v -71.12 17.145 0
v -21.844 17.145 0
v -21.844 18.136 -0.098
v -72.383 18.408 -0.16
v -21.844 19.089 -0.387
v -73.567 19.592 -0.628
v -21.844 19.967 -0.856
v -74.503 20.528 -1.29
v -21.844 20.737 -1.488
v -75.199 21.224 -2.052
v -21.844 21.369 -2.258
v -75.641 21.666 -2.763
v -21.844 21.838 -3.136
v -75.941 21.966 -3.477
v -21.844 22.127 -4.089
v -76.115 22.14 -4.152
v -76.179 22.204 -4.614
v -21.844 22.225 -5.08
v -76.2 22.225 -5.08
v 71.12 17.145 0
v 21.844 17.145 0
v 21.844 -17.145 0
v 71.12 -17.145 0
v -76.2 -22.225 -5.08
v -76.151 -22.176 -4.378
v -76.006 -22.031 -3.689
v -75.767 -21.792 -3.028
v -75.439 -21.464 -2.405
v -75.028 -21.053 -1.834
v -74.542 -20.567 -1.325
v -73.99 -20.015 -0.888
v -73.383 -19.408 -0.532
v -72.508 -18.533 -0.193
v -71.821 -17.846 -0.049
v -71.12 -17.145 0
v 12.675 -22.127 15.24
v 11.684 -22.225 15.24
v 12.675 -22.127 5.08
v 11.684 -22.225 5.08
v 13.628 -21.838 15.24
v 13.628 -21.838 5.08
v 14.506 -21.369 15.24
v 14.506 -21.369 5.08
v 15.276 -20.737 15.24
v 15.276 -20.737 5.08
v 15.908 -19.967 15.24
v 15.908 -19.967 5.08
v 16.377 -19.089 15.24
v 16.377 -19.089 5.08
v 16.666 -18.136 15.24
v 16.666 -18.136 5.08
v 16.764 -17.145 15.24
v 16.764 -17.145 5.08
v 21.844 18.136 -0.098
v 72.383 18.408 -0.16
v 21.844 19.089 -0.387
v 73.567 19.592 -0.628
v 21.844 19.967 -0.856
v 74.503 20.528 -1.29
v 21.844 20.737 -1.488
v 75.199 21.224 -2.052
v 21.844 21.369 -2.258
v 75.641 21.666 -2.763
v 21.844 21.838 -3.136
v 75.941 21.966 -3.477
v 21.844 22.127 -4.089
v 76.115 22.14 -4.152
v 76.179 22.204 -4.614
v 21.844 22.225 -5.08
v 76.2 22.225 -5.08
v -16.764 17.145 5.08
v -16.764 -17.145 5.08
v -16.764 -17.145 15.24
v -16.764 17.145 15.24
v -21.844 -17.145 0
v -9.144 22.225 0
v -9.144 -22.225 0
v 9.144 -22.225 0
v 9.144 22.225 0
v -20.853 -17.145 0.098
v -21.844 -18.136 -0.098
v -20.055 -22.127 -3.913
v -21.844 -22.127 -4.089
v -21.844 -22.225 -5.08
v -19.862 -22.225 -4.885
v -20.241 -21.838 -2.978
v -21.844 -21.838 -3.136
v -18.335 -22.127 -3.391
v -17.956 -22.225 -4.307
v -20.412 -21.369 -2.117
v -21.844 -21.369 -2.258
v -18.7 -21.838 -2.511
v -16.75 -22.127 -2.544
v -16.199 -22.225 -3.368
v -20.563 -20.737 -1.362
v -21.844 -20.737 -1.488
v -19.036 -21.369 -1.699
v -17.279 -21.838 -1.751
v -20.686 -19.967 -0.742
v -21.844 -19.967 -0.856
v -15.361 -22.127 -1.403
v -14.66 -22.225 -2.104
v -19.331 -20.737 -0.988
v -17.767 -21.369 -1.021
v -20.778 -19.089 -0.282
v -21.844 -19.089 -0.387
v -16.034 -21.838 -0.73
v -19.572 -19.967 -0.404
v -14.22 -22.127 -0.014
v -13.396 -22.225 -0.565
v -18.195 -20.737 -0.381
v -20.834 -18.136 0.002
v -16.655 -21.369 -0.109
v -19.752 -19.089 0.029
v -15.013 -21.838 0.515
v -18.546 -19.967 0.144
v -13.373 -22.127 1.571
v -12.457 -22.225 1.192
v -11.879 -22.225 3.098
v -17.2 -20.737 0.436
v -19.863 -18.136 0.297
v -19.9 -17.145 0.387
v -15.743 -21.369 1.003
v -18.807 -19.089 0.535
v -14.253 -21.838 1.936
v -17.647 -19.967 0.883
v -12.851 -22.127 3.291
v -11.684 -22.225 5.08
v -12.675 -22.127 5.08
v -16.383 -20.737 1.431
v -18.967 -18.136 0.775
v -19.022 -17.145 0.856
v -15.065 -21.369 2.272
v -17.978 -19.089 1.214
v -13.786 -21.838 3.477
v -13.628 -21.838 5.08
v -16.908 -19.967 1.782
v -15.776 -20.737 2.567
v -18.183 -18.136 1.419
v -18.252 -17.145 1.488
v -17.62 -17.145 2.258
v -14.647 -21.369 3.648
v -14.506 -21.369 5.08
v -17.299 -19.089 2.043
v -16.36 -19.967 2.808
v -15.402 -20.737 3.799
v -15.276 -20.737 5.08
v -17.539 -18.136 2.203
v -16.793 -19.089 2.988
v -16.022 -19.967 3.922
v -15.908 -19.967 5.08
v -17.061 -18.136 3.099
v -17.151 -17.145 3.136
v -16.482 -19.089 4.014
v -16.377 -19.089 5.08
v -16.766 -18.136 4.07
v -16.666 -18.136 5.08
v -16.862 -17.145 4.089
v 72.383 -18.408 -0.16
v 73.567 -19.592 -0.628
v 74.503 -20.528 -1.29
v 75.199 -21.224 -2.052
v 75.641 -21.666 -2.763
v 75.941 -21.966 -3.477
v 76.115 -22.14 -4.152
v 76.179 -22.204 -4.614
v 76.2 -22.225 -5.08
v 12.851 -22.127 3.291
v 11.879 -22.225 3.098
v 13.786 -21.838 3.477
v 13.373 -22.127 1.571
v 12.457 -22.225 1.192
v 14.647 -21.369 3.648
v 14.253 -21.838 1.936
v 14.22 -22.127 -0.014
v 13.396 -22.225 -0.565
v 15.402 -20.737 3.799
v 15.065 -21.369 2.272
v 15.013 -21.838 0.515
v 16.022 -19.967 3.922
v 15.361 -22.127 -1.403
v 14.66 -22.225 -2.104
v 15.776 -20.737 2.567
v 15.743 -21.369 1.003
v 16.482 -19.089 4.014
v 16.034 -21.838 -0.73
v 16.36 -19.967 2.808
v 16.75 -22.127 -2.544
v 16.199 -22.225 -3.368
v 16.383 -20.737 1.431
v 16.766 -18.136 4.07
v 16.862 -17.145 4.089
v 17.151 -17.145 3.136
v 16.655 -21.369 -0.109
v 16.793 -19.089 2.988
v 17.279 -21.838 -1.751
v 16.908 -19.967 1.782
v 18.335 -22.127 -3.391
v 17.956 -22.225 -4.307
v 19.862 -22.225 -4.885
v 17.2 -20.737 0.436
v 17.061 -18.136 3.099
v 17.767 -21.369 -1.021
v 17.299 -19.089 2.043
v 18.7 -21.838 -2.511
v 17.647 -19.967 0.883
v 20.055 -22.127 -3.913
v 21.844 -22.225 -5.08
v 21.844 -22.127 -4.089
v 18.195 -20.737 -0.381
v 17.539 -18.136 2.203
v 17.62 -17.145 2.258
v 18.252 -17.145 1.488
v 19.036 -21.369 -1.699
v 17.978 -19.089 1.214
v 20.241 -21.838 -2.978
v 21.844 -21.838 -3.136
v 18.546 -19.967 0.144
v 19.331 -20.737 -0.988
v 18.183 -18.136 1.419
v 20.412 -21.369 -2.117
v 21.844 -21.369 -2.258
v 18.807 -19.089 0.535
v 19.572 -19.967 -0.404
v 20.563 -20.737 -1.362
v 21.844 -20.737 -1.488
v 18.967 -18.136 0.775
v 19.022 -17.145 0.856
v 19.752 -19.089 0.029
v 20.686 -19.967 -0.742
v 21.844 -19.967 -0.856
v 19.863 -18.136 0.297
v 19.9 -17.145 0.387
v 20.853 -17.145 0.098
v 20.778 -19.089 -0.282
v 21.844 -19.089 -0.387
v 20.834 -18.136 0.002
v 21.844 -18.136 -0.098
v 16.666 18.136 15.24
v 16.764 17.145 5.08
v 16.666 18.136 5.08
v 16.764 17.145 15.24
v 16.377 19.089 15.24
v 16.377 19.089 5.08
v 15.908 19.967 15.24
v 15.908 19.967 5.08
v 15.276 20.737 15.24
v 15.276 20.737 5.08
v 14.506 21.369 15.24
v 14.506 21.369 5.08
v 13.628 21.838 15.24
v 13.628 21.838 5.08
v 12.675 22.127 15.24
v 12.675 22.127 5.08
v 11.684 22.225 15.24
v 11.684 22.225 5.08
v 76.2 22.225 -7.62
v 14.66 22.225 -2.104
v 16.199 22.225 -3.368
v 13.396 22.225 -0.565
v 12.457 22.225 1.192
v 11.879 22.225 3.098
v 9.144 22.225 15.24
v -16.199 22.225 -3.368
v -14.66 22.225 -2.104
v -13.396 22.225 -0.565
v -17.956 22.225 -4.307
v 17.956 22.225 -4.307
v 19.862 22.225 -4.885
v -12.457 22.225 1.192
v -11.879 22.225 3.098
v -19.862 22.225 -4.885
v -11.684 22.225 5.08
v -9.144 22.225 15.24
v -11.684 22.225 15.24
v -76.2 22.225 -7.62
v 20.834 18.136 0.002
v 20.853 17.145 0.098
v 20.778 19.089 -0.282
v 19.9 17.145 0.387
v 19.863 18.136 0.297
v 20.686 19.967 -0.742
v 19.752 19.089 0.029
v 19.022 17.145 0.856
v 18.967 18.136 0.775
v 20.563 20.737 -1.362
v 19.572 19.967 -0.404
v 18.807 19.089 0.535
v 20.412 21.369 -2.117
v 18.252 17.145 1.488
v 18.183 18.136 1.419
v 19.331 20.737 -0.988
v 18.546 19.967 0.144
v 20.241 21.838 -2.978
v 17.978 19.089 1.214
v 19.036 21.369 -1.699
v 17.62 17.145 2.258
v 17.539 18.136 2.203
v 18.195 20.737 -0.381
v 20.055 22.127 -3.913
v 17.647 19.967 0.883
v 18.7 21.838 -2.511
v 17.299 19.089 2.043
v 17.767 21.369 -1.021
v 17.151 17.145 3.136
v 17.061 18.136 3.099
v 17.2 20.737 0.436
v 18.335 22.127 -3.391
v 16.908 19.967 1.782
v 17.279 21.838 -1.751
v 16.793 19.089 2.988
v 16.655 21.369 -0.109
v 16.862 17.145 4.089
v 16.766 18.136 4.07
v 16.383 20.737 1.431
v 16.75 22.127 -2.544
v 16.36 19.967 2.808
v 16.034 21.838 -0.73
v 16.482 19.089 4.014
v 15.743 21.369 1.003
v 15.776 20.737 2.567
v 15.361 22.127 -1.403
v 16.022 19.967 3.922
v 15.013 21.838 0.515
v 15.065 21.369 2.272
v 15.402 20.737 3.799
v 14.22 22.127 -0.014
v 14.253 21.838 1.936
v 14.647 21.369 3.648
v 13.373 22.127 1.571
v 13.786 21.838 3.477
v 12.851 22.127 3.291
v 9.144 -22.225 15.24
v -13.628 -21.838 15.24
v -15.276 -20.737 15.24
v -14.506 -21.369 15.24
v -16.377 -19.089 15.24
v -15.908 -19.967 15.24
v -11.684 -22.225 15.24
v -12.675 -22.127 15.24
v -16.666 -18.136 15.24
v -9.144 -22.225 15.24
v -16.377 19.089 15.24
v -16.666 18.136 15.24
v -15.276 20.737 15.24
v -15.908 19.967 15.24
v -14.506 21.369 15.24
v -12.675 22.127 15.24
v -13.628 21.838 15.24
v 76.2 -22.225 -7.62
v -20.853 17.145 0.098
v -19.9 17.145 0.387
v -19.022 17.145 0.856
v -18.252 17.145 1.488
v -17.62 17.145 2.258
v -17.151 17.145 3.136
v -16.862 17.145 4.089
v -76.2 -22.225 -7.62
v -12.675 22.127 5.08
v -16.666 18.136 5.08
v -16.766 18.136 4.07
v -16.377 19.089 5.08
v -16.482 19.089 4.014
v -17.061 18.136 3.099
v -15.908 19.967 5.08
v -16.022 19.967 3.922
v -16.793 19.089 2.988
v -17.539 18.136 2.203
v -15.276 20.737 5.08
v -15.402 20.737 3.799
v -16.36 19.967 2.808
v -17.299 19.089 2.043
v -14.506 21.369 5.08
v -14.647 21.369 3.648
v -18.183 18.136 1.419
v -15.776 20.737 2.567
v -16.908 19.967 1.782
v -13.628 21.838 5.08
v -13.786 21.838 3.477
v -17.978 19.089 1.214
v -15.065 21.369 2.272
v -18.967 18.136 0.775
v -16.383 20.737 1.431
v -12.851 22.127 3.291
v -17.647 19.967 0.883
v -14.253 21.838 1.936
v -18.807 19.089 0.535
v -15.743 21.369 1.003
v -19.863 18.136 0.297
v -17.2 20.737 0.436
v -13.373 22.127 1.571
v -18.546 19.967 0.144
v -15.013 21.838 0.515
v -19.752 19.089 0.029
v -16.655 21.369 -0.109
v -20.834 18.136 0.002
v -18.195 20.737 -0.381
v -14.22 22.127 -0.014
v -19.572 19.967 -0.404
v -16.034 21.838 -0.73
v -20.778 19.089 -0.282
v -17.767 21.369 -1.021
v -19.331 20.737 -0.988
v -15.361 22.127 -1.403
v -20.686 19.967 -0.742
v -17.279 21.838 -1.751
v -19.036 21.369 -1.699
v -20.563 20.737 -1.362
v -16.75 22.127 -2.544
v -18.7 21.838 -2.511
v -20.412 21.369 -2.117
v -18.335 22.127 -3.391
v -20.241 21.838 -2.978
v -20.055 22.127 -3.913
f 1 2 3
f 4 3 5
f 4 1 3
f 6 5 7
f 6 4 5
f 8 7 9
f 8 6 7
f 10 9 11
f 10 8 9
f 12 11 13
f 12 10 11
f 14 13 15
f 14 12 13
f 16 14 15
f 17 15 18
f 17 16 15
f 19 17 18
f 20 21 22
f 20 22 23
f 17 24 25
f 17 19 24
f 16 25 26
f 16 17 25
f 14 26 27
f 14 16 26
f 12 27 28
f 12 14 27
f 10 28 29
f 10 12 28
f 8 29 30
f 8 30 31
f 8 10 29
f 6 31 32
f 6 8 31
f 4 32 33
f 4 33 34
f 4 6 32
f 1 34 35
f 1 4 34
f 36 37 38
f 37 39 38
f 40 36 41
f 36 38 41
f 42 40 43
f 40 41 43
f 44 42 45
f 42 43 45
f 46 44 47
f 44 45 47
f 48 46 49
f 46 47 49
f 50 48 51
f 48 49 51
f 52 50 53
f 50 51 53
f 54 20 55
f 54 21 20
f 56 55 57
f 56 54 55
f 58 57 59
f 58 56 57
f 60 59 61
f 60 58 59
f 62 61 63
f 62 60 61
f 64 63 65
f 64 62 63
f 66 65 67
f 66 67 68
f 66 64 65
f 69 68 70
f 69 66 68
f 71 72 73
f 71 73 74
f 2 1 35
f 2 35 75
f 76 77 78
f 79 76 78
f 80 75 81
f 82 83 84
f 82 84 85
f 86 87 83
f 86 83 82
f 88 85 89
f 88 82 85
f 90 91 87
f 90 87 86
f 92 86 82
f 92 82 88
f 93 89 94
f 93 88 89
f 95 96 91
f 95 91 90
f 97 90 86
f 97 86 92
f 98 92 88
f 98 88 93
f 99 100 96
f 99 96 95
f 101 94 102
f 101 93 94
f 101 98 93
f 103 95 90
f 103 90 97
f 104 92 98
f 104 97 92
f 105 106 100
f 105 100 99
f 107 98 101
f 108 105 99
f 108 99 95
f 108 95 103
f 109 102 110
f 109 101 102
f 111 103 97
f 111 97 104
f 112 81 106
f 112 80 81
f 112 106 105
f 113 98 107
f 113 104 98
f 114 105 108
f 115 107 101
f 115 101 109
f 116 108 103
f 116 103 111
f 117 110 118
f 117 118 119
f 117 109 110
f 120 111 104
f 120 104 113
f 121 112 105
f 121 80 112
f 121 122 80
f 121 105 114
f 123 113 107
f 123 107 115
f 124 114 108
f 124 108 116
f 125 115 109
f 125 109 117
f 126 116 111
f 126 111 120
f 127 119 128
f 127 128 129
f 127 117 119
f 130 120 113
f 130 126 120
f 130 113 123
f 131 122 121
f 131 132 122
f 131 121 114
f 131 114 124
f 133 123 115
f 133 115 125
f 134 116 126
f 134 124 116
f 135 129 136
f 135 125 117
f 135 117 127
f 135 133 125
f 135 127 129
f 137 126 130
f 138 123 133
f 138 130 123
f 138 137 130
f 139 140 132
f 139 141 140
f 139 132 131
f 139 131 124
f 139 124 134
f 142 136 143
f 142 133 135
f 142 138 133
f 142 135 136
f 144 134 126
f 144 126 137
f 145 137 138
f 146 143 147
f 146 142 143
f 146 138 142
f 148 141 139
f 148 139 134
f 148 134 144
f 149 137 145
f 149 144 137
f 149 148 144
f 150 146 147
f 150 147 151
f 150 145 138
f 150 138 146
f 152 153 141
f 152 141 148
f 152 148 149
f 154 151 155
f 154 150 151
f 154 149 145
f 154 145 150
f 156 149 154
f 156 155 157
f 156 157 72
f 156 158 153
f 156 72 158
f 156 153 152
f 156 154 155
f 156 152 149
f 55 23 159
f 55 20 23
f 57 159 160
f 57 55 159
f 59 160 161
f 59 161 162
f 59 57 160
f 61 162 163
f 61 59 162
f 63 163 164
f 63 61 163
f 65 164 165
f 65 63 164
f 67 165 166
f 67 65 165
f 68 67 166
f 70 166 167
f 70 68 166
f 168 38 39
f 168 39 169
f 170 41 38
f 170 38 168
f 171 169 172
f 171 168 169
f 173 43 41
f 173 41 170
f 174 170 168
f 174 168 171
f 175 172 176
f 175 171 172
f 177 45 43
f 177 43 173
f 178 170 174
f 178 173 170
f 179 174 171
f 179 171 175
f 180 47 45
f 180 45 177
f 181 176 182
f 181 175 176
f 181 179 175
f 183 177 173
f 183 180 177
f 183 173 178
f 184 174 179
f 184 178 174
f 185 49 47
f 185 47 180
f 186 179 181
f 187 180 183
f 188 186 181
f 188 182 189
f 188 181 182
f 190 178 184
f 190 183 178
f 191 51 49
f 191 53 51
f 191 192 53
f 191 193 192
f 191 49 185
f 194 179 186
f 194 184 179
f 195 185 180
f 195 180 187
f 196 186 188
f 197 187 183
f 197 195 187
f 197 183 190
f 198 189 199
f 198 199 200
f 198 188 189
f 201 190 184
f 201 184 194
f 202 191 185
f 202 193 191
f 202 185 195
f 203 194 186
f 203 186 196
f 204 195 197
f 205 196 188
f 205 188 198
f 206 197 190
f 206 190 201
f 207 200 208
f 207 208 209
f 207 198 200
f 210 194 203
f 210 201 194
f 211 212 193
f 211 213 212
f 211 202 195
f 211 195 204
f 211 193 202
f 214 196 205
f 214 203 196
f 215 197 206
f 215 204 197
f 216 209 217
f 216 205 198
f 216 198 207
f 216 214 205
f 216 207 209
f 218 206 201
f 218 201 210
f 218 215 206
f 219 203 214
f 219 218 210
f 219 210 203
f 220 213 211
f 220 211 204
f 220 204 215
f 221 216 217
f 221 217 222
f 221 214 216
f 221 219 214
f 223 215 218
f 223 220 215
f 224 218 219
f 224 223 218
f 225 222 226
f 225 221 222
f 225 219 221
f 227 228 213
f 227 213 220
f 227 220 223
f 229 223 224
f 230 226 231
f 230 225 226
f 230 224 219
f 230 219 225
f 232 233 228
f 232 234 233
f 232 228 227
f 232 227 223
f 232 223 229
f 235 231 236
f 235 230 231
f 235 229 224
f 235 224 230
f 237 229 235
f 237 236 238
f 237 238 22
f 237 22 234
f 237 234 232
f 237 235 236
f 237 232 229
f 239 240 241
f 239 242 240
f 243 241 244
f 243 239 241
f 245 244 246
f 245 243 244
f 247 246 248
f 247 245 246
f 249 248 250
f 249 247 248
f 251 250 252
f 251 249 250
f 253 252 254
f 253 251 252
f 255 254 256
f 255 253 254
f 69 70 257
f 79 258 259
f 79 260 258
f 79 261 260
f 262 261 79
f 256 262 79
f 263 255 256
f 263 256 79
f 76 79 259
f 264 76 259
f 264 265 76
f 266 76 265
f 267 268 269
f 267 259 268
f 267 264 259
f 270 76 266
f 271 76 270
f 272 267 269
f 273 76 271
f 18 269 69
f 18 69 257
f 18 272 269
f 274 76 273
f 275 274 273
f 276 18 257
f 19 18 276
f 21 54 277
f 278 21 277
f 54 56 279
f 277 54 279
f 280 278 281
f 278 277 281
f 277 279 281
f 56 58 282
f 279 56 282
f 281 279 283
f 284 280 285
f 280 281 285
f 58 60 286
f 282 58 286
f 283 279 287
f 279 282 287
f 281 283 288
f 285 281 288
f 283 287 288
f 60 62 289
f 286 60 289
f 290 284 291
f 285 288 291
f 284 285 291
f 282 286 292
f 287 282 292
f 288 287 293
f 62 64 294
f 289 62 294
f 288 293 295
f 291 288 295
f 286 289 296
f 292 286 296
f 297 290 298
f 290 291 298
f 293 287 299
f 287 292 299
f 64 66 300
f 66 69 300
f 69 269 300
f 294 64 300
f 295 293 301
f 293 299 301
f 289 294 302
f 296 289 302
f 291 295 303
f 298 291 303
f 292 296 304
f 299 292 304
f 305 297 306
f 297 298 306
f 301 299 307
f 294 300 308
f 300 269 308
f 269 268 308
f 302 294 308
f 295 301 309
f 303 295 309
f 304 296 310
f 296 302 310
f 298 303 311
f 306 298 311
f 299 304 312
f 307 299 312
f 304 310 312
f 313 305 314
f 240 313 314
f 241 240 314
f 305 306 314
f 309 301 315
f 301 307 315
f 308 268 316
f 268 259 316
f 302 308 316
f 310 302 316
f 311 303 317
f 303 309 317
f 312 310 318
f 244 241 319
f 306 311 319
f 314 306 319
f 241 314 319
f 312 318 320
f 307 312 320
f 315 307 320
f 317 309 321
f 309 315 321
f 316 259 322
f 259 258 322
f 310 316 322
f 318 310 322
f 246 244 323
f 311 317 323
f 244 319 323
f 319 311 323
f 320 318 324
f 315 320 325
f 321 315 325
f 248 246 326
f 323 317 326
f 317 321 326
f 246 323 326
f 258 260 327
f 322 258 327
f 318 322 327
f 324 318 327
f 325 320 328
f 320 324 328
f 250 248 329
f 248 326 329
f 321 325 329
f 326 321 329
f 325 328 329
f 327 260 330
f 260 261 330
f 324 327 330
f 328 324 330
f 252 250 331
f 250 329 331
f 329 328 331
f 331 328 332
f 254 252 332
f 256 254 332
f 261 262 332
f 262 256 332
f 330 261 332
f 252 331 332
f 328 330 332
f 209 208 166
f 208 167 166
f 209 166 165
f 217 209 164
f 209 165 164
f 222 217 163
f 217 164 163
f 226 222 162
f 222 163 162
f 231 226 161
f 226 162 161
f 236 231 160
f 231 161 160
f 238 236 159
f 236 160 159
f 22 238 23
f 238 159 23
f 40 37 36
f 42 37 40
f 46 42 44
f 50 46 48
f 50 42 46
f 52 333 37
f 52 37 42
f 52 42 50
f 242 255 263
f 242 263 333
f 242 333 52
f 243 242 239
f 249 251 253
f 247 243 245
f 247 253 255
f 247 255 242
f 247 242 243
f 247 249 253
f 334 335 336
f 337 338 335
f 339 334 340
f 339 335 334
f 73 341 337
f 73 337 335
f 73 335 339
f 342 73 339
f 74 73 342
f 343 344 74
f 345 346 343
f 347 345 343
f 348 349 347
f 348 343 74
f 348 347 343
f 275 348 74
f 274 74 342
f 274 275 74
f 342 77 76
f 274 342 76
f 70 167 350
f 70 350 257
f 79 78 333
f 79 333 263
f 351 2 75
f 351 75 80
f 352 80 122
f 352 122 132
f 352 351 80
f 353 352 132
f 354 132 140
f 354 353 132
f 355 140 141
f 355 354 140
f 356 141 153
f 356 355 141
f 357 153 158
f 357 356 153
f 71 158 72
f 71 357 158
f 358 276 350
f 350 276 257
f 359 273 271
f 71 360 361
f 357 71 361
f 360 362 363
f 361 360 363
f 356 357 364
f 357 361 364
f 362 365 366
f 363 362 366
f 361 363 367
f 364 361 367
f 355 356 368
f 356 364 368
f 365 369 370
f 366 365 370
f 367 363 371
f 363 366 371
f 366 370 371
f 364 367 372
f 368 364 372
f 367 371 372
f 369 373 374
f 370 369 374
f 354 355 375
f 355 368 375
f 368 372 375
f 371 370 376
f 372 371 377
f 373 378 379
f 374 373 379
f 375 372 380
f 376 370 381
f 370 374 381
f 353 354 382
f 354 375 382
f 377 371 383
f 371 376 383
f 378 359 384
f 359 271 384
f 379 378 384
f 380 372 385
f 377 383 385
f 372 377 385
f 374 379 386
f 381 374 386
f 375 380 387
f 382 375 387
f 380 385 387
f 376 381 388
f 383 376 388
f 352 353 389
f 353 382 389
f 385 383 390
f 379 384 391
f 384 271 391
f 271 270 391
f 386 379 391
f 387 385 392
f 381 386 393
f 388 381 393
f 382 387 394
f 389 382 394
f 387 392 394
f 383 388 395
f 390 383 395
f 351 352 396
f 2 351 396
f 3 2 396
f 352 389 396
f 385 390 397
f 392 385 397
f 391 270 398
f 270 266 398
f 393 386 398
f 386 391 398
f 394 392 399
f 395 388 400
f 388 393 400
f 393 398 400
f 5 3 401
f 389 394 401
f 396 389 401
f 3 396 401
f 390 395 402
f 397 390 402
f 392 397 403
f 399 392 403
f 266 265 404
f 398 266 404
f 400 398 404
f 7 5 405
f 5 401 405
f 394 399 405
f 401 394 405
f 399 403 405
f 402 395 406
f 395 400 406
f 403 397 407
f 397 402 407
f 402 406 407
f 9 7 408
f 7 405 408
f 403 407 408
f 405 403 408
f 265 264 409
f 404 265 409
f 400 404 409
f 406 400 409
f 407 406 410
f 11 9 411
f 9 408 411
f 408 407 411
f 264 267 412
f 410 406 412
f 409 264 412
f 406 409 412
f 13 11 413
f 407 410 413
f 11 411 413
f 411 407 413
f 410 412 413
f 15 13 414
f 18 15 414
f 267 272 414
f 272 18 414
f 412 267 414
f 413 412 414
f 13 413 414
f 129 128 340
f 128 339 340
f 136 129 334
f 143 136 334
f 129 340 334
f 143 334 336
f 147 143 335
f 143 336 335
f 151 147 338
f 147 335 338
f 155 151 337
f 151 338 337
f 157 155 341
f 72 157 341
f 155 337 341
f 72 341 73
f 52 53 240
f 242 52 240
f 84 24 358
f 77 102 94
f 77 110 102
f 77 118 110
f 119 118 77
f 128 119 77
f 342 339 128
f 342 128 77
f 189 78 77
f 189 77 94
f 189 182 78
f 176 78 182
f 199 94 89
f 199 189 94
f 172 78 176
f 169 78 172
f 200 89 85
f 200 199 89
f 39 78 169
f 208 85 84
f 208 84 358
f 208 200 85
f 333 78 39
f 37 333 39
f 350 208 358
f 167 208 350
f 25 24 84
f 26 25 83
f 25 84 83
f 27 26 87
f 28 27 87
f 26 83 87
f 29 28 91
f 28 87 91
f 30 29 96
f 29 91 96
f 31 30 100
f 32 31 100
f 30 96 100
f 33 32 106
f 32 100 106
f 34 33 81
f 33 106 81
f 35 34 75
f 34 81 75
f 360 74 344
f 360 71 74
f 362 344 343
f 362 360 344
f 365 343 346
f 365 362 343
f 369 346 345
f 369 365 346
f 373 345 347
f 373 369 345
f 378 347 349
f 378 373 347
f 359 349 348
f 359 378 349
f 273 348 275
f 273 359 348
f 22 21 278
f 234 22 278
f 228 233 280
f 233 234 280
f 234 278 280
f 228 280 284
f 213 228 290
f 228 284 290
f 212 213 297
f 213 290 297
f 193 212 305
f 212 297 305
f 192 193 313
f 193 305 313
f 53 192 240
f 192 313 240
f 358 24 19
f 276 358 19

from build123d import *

# Parameters (mm, degrees)
F0_W     = 59.436
F0_H     = 44.45
F0_W_2   = 7.62
F0_W_3   = 18.288
F1_DEPTH = 7.62
F2_DEPTH = 15.24
F3_F1_R  = 5.08
F3_F2_R  = 5.08


with BuildPart() as f1:
    # F0 (on Top) → F1 (new body)
    with BuildSketch(Plane.XY):
        with Locations((-46.482, 0)):
            Rectangle(F0_W, F0_H)
        with Locations((-12.954, 0)):
            Rectangle(F0_W_2, F0_H)
        Rectangle(F0_W_3, F0_H)
        with Locations((12.954, 0)):
            Rectangle(F0_W_2, F0_H)
        with Locations((46.482, 0)):
            Rectangle(F0_W, F0_H)
    extrude(amount=-F1_DEPTH)

    # F0 (on Top) → F2 (join)
    with BuildSketch(Plane.XY):
        with Locations((-12.954, 0)):
            Rectangle(F0_W_2, F0_H)
        with Locations((12.954, 0)):
            Rectangle(F0_W_2, F0_H)
    extrude(amount=F2_DEPTH)

    # F3: fillet of radius 5.08 on 8 edges, made by hand

    # F3_f1
    f3_f1_edges = [f1.edges().sort_by_distance(p)[0] for p in [
        (16.764, 0, 0),
        (-16.764, 0, 0),
    ]]
    fillet(f3_f1_edges, radius=F3_F1_R)

    # F3_f2
    f3_f2_edges = [f1.edges().sort_by_distance(p)[0] for p in [
        (49.022, 22.225, 0),
        (76.2, 0, 0),
        (49.022, -22.225, 0),
        (-49.022, 22.225, 0),
        (-49.022, -22.225, 0),
        (-76.2, 0, 0),
        (-18.2518975516, -22.225, 1.4878975516),
        (-18.2518975516, 22.225, 1.4878975516),
        (18.2518975516, -22.225, 1.4878975516),
        (18.2518975516, 22.225, 1.4878975516),
    ]]
    fillet(f3_f2_edges, radius=F3_F2_R)


solid = f1.part
